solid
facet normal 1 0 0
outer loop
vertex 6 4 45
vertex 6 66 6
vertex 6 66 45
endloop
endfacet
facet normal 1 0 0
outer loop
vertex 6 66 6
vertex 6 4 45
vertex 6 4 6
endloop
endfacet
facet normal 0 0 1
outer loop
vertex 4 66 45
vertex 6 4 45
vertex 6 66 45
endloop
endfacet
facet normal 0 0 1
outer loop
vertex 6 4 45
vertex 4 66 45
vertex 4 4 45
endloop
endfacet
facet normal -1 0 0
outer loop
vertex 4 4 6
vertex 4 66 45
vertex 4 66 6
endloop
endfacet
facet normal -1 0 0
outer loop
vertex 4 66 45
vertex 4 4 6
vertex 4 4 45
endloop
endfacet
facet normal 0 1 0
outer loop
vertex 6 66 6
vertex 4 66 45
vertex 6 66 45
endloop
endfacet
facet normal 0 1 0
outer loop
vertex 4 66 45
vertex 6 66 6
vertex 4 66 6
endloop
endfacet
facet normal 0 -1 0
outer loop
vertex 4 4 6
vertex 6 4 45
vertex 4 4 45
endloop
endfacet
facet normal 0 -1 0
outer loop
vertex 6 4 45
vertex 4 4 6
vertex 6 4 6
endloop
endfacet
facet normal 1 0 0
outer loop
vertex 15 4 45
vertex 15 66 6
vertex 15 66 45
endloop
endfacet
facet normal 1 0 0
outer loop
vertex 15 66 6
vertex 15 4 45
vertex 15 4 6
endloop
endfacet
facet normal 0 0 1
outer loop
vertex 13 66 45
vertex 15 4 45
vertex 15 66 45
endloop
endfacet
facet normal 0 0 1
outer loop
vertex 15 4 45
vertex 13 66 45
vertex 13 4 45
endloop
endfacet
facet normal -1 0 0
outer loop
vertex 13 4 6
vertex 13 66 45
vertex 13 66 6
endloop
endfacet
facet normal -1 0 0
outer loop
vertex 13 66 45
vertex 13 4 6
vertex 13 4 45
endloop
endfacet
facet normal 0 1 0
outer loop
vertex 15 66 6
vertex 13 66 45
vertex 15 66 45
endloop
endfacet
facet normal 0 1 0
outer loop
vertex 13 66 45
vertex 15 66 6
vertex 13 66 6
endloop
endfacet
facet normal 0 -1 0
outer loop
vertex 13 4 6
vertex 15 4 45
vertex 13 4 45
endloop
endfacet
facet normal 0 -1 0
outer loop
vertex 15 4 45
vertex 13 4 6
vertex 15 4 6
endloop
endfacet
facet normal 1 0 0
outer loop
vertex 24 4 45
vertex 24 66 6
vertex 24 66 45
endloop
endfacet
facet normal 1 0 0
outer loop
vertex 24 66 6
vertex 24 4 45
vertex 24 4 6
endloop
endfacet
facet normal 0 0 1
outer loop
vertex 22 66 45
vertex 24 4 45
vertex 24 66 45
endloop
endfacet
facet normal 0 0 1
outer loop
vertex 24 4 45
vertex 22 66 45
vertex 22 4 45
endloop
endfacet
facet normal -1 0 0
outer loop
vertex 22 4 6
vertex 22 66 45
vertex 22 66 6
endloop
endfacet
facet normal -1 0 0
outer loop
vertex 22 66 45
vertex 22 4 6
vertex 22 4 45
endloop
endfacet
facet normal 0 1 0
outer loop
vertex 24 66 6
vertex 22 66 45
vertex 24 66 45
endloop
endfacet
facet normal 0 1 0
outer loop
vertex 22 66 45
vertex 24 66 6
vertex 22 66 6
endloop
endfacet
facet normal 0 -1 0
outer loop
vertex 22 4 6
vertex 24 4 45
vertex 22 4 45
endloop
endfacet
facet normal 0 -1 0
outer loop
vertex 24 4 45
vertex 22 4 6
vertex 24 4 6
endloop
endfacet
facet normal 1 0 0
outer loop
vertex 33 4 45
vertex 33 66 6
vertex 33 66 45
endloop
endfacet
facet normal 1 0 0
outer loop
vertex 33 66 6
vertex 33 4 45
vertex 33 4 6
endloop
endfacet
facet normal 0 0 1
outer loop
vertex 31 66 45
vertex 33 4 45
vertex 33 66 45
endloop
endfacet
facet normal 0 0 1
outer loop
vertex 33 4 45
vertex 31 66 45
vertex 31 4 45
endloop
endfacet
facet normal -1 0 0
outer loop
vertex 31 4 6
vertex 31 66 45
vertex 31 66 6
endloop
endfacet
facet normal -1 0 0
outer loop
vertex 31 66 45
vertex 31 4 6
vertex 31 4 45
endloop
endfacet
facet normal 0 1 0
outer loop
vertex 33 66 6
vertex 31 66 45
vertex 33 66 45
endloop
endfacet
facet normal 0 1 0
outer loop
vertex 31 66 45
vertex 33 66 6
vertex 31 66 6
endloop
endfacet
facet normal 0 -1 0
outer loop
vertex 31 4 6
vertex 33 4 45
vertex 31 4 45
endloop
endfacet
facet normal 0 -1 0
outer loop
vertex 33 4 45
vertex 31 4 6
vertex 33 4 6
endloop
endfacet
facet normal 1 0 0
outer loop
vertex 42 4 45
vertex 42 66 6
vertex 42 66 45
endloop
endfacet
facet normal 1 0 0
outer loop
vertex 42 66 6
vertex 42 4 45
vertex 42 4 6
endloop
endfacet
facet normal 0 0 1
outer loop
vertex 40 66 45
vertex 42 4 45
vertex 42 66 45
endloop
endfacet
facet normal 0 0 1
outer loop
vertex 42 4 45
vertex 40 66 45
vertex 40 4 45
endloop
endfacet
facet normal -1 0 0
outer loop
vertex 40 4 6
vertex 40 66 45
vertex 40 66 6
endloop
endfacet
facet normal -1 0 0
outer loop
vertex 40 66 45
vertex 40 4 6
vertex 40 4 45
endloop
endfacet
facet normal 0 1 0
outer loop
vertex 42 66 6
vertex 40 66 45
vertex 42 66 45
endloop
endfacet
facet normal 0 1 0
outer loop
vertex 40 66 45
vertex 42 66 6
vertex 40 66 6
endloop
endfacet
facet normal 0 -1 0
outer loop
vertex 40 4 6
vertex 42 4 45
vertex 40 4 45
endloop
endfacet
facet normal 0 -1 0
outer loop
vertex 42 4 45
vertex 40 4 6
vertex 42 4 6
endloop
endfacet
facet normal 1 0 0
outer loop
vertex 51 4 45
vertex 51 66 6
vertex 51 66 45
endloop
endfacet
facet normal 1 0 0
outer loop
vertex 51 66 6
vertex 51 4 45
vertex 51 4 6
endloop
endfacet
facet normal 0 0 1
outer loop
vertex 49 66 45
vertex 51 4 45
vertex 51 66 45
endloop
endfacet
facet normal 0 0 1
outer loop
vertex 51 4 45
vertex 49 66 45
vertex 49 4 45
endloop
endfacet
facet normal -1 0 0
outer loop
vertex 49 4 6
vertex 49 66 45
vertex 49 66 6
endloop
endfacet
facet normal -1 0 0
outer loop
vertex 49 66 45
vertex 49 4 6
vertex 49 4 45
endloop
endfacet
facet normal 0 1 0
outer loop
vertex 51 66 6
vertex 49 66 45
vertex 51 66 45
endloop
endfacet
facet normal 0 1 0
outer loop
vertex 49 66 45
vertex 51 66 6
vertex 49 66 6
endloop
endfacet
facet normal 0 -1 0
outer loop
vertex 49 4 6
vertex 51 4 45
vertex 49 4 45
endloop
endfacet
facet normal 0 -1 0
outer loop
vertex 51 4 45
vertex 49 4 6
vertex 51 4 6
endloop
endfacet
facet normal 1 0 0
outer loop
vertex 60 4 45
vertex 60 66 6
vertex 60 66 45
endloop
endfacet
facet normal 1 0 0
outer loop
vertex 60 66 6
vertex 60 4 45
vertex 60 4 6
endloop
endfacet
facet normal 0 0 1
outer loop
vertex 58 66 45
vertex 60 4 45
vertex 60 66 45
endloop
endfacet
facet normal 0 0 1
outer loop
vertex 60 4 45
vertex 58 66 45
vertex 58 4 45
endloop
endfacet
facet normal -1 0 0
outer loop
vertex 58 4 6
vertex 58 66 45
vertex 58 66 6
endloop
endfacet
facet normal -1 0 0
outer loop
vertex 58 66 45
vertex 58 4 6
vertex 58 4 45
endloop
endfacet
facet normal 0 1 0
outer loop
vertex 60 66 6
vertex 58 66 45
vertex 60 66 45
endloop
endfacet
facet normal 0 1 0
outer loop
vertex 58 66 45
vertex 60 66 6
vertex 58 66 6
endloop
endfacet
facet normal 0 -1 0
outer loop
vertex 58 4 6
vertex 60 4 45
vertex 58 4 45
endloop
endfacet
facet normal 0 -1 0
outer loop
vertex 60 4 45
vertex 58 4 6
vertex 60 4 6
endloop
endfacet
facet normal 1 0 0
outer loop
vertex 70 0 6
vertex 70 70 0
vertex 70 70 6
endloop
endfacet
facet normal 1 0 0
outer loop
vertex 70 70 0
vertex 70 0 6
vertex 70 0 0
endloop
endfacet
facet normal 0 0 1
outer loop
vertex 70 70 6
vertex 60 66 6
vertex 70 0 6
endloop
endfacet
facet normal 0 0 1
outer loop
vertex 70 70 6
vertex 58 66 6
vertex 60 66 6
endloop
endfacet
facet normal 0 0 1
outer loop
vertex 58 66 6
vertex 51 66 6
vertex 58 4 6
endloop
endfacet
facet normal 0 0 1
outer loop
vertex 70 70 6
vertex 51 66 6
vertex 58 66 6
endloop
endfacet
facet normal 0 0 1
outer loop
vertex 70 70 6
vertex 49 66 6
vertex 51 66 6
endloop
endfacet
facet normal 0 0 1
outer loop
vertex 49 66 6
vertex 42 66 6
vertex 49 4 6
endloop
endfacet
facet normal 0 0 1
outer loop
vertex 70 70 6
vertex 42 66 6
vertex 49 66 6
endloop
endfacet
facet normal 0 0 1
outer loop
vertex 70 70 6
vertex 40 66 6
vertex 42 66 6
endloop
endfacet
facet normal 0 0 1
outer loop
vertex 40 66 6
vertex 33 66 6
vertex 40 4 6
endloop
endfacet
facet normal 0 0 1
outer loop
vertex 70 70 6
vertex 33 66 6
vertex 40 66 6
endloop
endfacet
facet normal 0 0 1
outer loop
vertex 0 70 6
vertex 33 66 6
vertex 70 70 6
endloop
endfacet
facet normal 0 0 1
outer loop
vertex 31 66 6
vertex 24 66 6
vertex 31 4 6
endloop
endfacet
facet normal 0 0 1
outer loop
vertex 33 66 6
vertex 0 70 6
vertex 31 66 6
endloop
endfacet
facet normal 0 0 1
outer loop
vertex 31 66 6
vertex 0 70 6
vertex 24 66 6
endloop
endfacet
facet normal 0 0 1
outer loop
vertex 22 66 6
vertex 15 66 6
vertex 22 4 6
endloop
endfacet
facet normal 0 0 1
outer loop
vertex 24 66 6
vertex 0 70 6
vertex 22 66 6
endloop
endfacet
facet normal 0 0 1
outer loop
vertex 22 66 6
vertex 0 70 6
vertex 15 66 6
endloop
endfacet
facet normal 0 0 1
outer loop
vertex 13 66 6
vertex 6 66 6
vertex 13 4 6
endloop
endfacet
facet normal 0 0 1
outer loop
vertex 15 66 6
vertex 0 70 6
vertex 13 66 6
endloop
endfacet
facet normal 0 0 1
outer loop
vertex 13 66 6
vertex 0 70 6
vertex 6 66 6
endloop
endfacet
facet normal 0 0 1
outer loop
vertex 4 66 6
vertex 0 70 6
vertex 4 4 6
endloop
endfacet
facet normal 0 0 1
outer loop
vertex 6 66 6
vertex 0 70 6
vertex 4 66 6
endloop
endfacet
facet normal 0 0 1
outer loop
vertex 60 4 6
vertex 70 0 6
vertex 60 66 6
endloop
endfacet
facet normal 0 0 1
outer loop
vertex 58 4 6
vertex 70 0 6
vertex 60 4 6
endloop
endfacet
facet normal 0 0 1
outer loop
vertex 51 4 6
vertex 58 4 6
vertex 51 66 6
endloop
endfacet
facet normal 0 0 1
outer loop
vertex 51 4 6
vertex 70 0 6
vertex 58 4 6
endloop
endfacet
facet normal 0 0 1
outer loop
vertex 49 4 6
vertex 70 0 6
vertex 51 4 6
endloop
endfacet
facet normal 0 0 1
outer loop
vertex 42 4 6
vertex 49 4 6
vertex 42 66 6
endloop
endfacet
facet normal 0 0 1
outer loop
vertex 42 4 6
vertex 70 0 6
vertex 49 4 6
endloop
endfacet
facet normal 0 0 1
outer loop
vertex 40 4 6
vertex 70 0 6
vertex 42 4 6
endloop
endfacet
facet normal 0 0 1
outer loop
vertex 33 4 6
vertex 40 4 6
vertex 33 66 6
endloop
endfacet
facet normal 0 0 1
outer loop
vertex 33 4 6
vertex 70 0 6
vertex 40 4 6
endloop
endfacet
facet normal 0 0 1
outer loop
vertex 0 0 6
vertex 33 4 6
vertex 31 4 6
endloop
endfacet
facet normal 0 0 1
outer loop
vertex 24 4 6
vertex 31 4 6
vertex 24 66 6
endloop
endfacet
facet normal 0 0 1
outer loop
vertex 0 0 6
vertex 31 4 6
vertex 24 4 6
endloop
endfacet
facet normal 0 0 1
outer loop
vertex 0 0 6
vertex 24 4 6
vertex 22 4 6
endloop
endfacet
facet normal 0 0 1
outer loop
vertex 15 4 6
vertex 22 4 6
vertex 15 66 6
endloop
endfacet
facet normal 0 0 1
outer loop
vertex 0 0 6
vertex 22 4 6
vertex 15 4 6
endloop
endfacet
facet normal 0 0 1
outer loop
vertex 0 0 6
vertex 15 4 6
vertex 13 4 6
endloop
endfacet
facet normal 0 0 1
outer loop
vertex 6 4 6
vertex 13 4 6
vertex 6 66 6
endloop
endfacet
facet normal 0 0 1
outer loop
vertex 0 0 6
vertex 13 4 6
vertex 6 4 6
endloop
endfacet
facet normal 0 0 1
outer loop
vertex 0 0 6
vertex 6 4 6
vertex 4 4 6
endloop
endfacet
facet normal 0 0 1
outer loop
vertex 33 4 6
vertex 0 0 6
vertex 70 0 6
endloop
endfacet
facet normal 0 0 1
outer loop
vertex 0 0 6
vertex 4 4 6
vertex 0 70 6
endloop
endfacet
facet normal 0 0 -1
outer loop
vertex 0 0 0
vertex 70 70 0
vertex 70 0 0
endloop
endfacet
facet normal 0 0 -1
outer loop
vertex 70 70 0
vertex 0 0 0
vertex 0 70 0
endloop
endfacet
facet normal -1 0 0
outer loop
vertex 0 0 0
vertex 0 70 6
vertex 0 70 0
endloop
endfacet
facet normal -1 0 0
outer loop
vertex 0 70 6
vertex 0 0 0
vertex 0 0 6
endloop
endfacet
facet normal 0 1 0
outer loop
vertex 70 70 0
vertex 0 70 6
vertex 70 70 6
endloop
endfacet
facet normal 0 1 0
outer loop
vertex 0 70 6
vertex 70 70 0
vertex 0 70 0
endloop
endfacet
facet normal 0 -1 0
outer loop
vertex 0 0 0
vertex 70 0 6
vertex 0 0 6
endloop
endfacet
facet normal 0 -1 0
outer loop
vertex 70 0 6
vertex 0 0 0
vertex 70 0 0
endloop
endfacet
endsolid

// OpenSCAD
$fn = 32;

// ----------------------------------------------------------------------
// Heatsink: uniform fin block
// ----------------------------------------------------------------------

// --- parameters (mm) ---
base_l = 70;              // base length, X
base_w = 70;              // base width, Y
base_t = 6;               // base plate thickness
fin_h = 40;               // fin height above the base
fin_t = 2;                // fin thickness
edge = 4;                 // margin from the base ends
pitch = 9;                // fin pitch
fit_tol = 0.1;            // tolerance for press fits, mm
free_tol = 0.5;           // tolerance for clearance fits, mm

n_fins = floor((base_l - 2 * edge - fin_t) / pitch) + 1;  // fin count
total_h = base_t + fin_h - 1;  // overall height

union() {
  cube([base_l, base_w, base_t]);
  for (i = [0 : n_fins - 1])
    translate([edge + i * pitch, edge, base_t - 1])
      cube([fin_t, base_w - 2 * edge, fin_h]);
}
